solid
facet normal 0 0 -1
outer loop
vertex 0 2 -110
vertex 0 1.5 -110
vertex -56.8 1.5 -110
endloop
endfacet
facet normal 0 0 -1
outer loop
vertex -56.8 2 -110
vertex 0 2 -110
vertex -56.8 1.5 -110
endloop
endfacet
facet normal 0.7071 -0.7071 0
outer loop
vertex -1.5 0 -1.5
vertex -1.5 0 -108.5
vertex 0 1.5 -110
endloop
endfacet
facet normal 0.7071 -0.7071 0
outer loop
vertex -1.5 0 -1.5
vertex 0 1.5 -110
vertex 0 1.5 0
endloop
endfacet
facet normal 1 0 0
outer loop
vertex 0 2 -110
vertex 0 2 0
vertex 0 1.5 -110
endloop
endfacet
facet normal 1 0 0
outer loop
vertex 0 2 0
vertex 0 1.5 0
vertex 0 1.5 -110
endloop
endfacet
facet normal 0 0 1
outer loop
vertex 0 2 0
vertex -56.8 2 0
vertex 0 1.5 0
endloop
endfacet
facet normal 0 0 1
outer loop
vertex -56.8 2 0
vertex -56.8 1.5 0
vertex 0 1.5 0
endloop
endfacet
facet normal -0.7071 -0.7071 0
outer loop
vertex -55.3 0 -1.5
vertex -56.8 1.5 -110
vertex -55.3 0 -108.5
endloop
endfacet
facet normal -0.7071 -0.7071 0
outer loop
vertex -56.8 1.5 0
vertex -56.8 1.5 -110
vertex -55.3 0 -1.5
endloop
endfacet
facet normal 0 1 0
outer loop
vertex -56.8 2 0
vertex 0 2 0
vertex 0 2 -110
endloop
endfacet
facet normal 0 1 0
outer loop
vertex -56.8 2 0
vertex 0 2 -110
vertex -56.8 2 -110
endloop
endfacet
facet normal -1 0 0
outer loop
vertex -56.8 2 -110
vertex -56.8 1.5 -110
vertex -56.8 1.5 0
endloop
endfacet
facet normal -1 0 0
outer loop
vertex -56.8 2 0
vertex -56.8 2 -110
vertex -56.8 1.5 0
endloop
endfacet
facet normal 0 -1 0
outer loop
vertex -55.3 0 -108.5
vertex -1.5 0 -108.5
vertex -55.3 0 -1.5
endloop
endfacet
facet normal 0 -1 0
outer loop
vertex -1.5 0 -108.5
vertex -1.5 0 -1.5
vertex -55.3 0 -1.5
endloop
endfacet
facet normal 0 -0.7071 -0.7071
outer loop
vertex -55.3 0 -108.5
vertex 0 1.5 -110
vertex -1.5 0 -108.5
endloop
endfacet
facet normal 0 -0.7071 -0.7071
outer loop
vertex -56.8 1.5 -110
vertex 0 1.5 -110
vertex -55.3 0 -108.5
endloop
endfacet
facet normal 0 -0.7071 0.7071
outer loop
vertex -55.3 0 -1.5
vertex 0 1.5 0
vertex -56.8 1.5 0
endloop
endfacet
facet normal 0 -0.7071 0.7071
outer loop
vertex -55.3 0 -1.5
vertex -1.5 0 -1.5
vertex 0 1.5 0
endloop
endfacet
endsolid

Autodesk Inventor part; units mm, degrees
ref_plane "YZ Plane" through (0, 0, 0) normal (1, 0, 0) x (0, 1, 0)
ref_plane "XZ Plane" through (0, 0, 0) normal (0, 1, 0) x (-1, 0, 0)
ref_plane "XY Plane" through (0, 0, 0) normal (0, 0, 1) x (1, 0, 0)
sketch "Sketch1" plane through (0, 0, 0) normal (0, 1, 0) x (-1, 0, 0)
  line L0 (0, 0) -> (0, -110)
  line L1 (0, -110) -> (56.8, -110)
  line L2 (56.8, -110) -> (56.8, 0)
  line L3 (56.8, 0) -> (0, 0)
  dimension "d0" = 110
  dimension "d1" = 56.8
extrude "Extrusion1" add sketch "Sketch1" along normal blind 2
chamfer "Chamfer1" distance 1.5 angle 45 1 edges at (0, 0, -55)
chamfer "Chamfer2" distance 1.5 angle 45 1 edges at (-56.8, 0, -55)
chamfer "Chamfer3" distance 1.5 angle 45 2 edges at (-28.4, 0, 0) (-28.4, 0, -110)
properties part number "priklop"
